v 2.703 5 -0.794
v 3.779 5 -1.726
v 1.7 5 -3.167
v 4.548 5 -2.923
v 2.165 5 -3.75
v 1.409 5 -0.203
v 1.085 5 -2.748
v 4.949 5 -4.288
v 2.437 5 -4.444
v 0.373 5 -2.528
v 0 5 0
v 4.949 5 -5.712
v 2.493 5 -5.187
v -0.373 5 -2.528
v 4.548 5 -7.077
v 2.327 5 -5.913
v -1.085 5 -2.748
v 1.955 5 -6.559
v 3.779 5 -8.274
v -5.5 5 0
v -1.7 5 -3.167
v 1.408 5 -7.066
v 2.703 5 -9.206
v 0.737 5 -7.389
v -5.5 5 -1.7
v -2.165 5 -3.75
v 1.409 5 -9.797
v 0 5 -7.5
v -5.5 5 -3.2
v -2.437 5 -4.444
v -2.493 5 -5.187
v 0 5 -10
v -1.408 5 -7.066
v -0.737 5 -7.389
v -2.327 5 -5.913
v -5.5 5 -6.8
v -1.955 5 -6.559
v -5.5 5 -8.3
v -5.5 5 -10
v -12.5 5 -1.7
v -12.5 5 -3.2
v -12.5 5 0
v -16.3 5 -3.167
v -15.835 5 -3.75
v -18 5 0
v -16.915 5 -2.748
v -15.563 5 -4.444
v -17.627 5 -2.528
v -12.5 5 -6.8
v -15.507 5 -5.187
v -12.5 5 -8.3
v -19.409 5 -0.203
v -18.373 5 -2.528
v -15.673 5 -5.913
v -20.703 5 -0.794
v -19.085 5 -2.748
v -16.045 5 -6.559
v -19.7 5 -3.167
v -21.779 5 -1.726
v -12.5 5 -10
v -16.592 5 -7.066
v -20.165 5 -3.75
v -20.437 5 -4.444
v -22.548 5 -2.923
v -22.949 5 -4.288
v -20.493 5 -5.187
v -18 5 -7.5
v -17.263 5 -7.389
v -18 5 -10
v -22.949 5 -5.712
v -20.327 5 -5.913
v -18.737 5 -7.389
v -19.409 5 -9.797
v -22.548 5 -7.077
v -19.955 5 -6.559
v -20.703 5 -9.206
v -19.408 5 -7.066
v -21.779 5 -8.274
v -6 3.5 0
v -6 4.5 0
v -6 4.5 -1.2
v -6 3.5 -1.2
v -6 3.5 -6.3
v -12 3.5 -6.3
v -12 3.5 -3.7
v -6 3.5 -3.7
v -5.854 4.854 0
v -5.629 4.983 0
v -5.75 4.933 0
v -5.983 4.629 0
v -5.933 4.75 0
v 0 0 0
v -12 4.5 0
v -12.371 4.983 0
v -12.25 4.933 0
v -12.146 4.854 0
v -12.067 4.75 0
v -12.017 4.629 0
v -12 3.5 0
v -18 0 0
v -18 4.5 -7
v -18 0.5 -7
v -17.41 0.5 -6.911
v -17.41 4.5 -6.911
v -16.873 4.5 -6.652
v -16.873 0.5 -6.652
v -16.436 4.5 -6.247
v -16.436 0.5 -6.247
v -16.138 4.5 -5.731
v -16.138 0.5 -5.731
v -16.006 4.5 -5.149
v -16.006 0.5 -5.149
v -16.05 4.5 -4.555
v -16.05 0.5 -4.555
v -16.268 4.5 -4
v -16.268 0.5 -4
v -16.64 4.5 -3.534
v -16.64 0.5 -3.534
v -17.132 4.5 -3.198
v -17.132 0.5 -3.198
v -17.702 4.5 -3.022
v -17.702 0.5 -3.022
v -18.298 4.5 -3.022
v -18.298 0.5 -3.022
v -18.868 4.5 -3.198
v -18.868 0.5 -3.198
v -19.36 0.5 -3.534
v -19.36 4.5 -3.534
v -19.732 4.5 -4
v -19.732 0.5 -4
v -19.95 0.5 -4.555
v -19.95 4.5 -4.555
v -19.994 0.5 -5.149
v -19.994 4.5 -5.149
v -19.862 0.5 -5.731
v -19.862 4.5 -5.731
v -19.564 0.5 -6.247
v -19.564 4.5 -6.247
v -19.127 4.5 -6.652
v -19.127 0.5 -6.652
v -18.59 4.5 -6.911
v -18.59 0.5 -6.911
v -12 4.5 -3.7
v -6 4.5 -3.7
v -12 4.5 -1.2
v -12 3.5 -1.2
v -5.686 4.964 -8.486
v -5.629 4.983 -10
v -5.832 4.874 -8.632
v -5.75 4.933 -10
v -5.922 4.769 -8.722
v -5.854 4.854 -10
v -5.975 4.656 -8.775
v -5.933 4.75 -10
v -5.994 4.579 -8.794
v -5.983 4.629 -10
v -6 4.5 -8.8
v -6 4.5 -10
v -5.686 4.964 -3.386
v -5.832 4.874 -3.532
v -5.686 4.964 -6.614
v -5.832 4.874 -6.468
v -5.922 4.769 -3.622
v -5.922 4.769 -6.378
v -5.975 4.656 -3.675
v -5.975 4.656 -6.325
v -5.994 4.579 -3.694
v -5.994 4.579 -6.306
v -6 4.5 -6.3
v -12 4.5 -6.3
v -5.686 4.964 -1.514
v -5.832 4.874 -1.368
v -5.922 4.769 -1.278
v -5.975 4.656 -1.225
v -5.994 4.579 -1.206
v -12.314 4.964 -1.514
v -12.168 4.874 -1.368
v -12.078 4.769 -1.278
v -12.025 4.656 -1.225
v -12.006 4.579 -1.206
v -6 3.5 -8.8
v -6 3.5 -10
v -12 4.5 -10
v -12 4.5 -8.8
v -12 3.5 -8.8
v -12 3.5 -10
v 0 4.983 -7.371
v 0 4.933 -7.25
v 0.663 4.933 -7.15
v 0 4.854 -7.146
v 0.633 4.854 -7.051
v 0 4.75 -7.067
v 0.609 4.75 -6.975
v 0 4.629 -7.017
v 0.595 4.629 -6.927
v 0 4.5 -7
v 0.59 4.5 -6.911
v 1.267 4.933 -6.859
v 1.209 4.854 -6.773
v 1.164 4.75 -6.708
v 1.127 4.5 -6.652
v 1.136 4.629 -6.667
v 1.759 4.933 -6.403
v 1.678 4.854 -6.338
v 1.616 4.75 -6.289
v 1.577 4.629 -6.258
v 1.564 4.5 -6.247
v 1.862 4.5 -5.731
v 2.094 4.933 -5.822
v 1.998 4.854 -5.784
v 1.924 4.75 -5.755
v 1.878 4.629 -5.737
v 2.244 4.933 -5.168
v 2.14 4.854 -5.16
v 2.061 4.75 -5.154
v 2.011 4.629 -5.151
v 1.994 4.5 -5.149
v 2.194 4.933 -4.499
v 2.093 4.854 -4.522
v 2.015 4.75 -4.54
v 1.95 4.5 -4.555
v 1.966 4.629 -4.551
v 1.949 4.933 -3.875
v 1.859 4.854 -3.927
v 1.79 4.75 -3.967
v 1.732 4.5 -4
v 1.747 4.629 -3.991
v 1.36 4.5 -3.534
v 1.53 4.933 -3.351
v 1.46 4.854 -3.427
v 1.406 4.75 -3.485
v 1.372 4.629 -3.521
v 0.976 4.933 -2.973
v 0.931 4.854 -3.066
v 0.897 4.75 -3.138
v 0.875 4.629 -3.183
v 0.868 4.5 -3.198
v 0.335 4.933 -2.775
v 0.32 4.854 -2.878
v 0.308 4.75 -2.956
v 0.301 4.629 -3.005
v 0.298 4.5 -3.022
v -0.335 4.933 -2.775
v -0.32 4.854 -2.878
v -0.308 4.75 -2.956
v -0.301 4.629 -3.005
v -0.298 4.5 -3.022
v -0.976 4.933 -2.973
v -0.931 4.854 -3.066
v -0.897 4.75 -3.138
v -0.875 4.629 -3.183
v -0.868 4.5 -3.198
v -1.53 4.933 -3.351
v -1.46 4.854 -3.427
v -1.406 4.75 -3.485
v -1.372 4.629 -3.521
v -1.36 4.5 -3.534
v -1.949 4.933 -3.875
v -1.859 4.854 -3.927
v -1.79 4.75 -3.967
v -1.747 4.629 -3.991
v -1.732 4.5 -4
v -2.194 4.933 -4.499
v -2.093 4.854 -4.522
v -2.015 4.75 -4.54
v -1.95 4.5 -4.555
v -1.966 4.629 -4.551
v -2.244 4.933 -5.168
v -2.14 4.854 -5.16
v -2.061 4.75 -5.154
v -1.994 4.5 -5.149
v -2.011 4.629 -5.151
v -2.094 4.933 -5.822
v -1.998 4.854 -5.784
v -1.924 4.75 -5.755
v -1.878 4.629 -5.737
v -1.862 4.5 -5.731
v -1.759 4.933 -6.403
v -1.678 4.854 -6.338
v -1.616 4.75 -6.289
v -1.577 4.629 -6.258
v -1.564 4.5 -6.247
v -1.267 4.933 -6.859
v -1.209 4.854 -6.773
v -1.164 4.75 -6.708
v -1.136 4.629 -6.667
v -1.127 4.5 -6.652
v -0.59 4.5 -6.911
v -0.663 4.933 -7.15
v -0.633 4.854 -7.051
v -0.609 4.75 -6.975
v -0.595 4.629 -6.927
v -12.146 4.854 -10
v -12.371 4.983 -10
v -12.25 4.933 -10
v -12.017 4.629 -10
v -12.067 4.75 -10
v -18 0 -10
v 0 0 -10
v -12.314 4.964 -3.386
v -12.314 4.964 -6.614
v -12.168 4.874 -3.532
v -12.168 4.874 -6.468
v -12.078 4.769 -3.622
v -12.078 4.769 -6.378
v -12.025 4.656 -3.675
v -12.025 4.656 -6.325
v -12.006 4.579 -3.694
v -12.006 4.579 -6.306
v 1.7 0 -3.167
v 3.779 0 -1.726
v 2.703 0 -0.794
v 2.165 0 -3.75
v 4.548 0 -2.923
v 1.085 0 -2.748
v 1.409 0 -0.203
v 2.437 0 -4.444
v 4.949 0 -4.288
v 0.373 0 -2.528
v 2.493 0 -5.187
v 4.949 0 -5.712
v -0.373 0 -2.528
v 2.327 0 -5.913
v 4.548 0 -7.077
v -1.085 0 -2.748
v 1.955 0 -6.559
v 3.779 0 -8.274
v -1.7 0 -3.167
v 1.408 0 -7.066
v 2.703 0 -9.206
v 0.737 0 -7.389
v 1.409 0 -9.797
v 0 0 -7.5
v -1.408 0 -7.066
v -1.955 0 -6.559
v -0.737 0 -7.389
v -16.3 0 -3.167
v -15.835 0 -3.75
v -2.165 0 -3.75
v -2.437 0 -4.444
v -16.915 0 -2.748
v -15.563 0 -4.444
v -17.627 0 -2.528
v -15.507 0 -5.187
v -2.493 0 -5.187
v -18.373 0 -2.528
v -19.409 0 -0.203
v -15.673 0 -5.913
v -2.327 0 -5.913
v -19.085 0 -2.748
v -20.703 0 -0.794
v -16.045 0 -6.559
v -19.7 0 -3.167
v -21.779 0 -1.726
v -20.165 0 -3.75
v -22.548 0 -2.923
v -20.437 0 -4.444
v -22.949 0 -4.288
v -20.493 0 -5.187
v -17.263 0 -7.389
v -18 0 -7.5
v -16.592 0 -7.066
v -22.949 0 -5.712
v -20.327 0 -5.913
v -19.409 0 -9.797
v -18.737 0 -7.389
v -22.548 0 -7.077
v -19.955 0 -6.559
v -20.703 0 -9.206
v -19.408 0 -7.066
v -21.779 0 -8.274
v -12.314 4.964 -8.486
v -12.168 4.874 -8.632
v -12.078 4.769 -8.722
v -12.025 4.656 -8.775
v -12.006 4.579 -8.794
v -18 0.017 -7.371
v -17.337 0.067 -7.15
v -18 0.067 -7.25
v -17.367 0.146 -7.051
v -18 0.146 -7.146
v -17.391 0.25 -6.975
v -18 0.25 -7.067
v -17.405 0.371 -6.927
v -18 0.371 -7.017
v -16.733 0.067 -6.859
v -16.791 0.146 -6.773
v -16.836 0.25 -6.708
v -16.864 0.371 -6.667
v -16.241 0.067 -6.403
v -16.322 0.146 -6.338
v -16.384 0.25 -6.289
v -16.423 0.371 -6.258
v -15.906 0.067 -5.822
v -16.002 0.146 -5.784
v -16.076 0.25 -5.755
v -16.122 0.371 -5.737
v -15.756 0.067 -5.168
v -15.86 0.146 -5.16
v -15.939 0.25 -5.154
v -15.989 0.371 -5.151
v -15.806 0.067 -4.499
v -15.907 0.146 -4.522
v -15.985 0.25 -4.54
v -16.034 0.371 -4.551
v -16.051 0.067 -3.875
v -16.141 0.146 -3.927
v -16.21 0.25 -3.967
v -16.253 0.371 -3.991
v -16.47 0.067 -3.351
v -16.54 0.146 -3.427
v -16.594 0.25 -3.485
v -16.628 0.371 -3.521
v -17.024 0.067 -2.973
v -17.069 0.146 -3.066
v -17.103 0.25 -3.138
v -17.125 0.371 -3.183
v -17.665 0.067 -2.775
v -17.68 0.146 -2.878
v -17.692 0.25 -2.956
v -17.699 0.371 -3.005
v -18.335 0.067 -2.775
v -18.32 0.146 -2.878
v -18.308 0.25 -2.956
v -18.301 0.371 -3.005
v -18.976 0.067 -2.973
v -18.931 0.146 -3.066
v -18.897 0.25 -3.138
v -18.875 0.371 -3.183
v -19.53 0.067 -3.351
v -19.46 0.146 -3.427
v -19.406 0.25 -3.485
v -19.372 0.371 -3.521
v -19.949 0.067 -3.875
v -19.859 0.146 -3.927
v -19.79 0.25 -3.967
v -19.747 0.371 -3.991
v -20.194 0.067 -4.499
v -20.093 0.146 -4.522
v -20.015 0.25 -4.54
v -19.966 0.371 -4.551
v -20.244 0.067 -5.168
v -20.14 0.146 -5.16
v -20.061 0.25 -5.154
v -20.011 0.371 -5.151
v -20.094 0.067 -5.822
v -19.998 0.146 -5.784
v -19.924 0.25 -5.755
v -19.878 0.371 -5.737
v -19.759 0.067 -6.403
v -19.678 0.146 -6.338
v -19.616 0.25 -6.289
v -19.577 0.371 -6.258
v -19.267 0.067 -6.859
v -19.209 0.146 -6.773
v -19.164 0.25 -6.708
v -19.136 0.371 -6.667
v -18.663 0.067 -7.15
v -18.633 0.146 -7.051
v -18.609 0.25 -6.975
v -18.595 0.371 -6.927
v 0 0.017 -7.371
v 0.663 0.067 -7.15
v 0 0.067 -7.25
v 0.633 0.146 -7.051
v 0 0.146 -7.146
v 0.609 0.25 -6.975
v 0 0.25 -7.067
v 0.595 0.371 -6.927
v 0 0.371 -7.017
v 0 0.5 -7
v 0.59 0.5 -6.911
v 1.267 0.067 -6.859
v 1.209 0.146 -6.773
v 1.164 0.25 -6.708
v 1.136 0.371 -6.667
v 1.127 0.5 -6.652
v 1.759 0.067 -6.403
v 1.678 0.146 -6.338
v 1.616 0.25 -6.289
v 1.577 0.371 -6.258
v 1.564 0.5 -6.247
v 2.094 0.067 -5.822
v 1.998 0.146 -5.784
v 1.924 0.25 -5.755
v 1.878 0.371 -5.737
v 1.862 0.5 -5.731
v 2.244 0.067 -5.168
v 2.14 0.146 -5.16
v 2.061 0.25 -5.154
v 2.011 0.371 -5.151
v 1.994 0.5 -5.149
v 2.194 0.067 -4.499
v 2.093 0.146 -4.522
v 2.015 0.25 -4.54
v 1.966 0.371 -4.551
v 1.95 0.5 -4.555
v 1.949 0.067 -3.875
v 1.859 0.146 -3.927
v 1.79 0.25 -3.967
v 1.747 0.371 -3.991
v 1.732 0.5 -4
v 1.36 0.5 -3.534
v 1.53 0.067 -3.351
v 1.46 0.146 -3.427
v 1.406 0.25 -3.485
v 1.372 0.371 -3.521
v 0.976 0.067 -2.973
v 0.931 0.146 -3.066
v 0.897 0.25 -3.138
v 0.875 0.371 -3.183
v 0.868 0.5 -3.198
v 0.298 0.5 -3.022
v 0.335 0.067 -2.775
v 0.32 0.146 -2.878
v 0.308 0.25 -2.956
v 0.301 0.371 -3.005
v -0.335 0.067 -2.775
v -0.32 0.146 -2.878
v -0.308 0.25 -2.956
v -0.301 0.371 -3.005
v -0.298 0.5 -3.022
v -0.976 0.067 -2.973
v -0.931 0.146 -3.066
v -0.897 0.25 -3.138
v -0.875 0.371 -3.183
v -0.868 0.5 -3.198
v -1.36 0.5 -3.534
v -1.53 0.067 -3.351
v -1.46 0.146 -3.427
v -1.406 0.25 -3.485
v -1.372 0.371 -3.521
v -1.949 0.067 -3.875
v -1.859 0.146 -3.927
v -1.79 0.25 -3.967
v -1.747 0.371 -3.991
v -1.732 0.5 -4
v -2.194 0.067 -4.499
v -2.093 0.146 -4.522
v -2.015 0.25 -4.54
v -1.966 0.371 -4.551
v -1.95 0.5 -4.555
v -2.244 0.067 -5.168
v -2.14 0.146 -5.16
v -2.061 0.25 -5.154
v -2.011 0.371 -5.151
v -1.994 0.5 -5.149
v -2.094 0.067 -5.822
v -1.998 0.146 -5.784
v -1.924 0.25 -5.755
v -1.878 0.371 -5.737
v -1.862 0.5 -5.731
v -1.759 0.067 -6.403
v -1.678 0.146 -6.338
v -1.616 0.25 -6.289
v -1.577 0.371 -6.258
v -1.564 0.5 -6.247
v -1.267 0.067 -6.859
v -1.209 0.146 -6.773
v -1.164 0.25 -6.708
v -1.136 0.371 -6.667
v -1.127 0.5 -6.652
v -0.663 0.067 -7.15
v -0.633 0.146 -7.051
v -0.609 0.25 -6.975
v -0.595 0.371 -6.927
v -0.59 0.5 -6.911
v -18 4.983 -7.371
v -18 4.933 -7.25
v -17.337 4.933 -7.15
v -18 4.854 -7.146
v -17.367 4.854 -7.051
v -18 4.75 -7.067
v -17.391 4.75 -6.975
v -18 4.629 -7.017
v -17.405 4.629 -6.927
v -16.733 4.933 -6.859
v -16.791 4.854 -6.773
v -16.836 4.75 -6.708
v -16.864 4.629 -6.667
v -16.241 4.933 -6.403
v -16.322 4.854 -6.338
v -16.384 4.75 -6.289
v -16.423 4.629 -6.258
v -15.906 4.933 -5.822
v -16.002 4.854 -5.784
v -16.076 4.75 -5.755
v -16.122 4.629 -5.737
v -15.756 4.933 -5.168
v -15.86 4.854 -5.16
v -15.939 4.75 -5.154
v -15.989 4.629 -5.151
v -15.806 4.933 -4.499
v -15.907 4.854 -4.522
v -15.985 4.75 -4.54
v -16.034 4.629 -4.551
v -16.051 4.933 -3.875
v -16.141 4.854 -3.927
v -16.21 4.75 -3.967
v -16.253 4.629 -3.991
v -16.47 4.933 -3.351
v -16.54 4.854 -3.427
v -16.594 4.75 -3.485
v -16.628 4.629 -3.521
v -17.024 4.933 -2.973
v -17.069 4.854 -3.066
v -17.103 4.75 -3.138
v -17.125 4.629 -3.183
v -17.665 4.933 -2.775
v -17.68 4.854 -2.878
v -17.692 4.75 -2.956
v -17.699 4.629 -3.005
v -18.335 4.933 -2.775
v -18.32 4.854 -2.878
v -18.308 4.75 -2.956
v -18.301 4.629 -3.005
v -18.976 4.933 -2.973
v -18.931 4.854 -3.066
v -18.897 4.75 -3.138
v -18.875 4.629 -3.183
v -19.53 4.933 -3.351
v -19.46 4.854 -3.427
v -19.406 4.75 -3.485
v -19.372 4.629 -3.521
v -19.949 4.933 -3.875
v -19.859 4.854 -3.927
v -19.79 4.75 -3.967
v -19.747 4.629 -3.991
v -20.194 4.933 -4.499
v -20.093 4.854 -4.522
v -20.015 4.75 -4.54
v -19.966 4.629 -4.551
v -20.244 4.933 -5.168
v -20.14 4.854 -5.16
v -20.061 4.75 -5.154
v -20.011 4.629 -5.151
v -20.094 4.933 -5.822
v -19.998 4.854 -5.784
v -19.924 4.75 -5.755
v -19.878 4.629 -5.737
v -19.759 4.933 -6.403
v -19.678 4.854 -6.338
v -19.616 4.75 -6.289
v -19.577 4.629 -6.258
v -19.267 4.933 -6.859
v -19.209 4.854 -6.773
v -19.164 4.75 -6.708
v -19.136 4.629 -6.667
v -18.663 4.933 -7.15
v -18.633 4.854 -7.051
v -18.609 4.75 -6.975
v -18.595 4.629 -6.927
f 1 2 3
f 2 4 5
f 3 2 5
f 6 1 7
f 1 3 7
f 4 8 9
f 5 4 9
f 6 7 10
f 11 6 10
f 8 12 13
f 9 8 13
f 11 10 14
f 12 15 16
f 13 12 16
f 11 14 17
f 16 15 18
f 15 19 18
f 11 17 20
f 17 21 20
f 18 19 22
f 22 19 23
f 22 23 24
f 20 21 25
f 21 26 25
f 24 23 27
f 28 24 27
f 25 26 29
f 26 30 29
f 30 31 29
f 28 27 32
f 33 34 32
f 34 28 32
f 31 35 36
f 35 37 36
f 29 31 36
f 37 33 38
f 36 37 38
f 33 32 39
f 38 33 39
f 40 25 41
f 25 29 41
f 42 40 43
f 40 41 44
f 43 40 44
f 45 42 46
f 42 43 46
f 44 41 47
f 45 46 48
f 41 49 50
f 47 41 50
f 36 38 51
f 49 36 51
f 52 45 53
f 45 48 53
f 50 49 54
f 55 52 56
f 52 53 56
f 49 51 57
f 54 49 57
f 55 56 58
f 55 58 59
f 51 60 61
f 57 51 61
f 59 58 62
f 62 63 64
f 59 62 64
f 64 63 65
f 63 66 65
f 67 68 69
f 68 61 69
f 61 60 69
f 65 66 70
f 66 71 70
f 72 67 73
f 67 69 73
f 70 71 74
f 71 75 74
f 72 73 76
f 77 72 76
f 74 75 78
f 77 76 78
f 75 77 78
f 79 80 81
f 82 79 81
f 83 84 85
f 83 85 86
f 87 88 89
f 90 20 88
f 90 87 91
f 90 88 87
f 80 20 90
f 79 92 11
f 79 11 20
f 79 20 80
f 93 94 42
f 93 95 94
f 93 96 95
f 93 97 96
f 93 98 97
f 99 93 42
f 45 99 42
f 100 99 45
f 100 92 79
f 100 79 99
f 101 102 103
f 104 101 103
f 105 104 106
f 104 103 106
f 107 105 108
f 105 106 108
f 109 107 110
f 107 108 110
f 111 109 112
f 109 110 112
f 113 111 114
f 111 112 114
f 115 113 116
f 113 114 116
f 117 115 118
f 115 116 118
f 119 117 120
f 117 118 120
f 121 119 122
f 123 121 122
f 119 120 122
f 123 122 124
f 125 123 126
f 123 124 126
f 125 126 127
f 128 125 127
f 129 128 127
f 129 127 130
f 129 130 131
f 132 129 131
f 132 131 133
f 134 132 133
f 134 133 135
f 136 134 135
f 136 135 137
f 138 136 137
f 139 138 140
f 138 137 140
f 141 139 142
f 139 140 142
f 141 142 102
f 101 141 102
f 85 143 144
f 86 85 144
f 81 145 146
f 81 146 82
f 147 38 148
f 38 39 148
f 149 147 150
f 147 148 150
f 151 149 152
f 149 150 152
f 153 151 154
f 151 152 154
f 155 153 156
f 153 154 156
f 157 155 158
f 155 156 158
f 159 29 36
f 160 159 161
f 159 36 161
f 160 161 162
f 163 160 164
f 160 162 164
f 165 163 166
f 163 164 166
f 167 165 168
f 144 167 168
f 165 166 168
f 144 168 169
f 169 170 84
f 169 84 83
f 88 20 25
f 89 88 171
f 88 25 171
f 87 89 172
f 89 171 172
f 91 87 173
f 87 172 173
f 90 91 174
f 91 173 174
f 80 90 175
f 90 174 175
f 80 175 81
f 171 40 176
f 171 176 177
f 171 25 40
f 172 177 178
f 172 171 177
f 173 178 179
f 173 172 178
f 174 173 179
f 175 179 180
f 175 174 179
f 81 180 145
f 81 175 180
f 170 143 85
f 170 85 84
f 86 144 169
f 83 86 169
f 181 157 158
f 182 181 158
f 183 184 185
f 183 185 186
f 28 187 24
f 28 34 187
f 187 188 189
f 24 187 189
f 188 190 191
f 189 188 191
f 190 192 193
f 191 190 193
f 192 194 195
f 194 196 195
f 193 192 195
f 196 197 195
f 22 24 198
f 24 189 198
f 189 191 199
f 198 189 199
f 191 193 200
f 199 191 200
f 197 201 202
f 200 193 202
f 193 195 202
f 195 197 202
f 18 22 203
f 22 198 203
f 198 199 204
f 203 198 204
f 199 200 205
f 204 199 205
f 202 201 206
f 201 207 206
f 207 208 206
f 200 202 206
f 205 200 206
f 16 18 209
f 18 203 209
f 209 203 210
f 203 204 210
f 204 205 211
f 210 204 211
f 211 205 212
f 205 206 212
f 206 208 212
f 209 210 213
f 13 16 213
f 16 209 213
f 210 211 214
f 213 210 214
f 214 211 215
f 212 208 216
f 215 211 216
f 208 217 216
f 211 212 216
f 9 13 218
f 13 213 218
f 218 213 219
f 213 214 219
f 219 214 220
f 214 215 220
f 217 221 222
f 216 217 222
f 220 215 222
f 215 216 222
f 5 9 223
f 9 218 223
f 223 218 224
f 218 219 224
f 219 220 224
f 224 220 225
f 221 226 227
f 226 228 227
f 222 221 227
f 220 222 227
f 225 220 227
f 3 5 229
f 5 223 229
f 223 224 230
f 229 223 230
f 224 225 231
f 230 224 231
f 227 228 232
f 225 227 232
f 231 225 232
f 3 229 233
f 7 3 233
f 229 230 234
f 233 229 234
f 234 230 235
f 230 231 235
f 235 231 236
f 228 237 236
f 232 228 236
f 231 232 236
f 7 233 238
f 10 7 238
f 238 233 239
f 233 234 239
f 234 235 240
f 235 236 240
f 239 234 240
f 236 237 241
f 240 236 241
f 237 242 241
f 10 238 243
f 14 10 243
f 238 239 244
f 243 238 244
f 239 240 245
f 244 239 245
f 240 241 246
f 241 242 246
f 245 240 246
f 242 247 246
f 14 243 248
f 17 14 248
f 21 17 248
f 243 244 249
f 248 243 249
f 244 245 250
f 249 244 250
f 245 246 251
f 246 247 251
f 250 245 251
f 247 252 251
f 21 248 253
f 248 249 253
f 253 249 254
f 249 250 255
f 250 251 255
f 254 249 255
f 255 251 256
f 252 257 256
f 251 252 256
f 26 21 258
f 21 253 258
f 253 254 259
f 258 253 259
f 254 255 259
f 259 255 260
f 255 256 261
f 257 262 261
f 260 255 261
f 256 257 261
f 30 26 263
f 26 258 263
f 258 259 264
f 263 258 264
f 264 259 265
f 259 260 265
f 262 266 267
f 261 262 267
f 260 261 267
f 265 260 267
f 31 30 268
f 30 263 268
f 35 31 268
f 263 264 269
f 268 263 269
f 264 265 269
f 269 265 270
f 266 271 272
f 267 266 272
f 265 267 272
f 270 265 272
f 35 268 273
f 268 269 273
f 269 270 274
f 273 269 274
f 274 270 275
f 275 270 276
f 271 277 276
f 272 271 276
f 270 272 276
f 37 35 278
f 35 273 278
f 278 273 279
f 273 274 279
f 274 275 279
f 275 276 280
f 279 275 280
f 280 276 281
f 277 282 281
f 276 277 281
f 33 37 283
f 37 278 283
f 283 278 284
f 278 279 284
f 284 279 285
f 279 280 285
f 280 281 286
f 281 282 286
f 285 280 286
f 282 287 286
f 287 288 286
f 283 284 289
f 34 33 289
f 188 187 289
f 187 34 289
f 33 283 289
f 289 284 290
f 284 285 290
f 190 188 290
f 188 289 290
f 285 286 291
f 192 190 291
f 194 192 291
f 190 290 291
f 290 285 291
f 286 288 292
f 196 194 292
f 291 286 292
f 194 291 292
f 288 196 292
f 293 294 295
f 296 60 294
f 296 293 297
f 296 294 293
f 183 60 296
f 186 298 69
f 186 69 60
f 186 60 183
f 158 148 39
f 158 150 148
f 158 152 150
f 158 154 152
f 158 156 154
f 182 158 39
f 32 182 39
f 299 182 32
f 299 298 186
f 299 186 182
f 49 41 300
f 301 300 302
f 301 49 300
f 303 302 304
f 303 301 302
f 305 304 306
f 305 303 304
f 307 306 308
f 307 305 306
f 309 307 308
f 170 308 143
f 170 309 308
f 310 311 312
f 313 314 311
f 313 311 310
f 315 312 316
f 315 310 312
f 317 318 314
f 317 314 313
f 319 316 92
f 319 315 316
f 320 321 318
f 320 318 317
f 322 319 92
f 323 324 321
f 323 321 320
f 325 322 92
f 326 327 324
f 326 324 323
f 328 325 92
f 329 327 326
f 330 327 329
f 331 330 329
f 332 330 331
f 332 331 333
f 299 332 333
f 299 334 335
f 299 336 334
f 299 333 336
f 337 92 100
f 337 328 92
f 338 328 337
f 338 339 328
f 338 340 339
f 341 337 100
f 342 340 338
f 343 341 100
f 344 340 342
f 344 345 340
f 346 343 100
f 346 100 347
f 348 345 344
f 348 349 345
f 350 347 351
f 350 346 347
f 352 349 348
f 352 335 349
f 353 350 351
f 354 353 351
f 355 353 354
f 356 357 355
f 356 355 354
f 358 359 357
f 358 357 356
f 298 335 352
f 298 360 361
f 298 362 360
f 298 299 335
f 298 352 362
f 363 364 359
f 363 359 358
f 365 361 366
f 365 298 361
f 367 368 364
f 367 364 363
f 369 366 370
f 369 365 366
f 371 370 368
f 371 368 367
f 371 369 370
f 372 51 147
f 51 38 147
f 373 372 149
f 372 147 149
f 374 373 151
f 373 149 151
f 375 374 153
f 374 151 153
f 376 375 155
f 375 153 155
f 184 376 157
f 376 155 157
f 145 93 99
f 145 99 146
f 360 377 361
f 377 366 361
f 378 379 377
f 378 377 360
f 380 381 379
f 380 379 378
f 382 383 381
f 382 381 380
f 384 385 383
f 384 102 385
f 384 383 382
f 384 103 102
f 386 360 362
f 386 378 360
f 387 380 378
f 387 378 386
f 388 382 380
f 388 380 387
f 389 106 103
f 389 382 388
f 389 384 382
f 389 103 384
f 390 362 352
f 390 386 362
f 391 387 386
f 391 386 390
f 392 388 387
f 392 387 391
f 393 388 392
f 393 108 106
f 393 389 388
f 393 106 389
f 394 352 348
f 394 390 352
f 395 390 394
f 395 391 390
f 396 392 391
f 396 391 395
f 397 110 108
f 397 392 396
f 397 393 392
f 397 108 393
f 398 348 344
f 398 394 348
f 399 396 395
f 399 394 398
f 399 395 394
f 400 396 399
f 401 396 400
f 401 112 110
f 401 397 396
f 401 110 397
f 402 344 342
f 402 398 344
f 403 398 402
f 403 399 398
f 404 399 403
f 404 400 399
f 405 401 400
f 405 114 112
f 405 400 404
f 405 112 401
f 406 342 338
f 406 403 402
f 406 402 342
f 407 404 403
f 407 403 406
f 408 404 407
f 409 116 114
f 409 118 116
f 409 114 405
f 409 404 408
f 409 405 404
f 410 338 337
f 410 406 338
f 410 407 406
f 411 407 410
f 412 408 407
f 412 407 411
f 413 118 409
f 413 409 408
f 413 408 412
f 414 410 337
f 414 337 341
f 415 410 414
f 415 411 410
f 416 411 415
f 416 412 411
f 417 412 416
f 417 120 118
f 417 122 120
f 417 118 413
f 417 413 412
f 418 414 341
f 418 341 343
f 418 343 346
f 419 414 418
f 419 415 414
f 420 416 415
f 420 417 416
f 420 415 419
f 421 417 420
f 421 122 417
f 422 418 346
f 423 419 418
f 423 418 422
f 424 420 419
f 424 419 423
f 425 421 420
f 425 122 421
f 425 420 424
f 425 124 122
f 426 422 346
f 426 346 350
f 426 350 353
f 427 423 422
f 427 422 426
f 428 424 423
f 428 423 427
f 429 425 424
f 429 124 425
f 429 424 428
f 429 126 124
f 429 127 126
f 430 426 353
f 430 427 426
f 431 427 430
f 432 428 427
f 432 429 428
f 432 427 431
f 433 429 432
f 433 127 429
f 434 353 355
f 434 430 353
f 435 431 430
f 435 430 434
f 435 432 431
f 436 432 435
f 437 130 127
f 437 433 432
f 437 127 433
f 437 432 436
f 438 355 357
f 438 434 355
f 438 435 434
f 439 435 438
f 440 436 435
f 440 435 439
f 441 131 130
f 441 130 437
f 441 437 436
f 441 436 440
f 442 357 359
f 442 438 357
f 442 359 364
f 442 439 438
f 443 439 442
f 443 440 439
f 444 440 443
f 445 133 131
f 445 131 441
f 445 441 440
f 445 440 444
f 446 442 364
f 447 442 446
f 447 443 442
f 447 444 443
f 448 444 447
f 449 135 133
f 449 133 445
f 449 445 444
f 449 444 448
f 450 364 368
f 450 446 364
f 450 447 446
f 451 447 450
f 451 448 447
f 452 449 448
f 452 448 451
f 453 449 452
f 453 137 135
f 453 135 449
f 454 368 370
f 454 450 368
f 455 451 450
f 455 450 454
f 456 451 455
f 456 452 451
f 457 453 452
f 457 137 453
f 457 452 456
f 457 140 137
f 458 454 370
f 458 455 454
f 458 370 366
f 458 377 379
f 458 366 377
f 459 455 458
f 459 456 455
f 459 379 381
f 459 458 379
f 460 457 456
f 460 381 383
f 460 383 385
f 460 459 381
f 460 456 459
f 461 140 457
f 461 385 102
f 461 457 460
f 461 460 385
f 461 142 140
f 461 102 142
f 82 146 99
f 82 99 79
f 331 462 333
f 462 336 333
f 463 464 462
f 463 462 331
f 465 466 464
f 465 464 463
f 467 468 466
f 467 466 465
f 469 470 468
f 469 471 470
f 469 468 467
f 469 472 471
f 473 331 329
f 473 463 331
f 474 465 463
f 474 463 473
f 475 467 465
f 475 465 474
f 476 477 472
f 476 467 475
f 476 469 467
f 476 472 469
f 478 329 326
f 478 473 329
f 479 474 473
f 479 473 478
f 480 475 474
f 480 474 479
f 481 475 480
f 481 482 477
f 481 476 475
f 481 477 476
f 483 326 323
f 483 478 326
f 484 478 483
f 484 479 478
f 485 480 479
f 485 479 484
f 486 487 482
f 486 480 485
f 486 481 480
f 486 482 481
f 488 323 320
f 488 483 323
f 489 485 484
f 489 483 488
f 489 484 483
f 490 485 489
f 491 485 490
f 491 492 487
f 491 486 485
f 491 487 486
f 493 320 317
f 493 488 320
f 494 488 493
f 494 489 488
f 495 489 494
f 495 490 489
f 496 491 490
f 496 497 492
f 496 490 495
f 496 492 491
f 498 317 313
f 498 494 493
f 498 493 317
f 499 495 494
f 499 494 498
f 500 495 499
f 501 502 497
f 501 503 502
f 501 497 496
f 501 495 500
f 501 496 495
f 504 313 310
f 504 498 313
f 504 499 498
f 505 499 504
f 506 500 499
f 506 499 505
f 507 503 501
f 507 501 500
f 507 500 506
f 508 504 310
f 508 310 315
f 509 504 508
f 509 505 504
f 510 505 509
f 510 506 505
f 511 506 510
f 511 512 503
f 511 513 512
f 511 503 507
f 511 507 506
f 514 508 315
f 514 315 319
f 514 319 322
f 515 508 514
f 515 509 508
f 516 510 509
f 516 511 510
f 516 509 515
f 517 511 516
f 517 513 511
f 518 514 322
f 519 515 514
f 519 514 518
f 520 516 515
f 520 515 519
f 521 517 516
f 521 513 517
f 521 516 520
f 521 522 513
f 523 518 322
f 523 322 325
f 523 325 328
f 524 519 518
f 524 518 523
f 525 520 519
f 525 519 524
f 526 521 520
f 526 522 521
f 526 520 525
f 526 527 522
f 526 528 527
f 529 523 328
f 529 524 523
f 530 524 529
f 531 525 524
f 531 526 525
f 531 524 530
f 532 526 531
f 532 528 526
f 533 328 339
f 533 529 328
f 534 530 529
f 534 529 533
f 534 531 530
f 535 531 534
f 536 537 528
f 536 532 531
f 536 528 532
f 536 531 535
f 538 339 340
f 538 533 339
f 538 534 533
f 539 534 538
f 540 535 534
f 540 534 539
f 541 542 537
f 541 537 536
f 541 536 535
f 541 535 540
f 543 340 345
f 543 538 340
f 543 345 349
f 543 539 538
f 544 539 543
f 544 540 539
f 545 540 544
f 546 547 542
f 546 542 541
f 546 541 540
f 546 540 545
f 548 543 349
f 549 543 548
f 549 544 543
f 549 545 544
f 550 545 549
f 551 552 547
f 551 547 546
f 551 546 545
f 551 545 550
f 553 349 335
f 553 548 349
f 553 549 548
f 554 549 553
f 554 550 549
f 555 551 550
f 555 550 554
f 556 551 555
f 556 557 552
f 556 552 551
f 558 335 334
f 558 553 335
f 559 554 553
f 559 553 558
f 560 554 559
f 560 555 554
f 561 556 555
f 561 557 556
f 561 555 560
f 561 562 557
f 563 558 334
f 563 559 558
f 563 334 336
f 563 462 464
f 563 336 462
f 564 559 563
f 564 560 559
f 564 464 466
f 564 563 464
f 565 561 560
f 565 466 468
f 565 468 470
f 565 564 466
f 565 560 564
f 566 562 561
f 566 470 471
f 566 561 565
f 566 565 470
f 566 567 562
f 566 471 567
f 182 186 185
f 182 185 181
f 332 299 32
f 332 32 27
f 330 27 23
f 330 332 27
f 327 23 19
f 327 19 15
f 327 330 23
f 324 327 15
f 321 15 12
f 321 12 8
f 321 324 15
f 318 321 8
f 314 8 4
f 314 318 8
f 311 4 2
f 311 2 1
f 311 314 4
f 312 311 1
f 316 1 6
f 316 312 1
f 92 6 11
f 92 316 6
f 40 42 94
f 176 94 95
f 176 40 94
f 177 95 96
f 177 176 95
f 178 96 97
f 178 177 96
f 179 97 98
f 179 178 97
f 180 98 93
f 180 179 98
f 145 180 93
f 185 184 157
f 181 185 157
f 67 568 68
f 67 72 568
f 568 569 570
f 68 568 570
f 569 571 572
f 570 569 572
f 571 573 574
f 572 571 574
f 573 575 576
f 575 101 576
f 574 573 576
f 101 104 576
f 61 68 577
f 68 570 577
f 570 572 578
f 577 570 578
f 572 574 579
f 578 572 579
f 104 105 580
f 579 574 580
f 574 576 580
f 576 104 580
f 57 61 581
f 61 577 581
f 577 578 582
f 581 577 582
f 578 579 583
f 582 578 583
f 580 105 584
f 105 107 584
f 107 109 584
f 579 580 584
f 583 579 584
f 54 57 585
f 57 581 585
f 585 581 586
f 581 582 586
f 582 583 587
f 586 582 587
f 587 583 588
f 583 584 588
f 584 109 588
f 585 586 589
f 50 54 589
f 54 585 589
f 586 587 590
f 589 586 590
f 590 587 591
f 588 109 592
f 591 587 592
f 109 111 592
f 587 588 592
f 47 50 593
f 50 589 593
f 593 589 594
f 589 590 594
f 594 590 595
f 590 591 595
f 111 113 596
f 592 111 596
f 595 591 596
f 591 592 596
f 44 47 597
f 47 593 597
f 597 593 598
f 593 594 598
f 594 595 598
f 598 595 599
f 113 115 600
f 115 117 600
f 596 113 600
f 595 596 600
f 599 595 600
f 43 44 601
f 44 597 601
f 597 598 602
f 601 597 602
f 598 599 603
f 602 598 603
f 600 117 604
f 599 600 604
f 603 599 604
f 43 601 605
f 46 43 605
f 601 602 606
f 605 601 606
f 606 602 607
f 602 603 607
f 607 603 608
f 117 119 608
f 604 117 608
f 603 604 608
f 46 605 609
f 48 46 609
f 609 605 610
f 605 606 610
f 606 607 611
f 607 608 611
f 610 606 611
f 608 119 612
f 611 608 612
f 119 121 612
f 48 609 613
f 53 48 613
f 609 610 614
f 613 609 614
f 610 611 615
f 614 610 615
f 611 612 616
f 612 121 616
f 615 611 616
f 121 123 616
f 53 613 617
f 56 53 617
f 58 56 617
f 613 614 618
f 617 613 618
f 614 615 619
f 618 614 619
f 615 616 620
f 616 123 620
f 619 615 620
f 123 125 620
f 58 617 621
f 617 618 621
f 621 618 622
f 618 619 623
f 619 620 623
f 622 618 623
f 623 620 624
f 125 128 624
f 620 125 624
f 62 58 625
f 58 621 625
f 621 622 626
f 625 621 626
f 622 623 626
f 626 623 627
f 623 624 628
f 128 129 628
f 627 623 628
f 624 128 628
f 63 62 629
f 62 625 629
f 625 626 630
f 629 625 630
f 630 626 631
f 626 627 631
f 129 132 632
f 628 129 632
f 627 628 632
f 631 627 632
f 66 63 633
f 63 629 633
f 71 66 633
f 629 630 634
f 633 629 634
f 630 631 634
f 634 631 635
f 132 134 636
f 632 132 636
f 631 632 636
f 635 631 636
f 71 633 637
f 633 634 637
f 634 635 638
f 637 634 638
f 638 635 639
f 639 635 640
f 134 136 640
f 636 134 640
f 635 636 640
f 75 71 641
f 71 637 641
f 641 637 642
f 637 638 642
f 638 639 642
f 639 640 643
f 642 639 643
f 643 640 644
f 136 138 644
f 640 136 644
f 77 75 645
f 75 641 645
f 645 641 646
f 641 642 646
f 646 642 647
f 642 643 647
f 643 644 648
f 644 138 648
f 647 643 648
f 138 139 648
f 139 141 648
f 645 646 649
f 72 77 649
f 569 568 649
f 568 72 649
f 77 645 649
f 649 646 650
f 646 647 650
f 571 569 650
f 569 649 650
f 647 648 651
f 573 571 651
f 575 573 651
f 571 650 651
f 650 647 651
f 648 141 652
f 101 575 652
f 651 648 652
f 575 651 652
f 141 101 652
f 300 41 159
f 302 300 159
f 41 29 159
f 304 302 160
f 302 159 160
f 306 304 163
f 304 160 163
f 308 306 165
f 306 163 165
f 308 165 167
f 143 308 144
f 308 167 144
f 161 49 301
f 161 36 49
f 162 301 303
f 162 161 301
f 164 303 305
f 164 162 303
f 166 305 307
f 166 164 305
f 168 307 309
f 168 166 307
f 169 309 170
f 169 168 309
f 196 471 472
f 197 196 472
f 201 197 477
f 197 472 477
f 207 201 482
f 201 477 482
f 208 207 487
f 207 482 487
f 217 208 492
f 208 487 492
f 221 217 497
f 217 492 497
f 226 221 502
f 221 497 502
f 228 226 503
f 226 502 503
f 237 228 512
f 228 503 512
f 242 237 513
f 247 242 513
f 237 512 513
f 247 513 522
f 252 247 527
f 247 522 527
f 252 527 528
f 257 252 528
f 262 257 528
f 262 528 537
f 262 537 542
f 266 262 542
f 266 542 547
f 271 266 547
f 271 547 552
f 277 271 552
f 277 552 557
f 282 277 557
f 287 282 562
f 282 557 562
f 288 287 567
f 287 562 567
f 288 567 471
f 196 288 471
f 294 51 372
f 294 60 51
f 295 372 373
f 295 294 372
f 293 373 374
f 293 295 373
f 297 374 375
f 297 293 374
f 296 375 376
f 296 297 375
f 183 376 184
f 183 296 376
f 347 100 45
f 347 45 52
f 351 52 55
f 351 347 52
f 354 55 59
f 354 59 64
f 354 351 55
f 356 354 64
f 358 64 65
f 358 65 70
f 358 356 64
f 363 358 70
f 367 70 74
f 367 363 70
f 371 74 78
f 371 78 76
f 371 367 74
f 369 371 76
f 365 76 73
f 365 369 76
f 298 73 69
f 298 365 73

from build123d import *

# Parameters (mm, degrees)
BOSS_EXTRUDE1_DEPTH = 5
SCREW_HOLES_R       = 2
CUT_EXTRUDE1_DEPTH  = 5
FILLET2_R           = 0.5
BELT_CUT_OUTS_W     = 6
BELT_CUT_OUTS_H     = 1.2
BELT_CUT_OUTS_H_2   = 2.6
CUT_EXTRUDE2_DEPTH  = 1.5
FILLET3_R           = 0.5


with BuildPart() as part:
    # Belt Clamp → Boss-Extrude1 (new body)
    with BuildSketch(Plane(origin=(0, 0, 0), x_dir=(1, 0, 0), z_dir=(0, 1, 0))):
        with BuildLine():
            Line((-18, 10), (0, 10))
            ThreePointArc((0, 10), (5, 5), (0, 0))
            Line((0, 0), (-18, 0))
            ThreePointArc((-18, 0), (-23, 5), (-18, 10))
        make_face()
    extrude(amount=BOSS_EXTRUDE1_DEPTH)

    # Screw Holes → Cut-Extrude1 (cut)
    with BuildSketch(Plane.XZ):
        with Locations(Location((-18, -5, 0), (0, 0, 270))):
            Circle(SCREW_HOLES_R)
        with Locations(Location((0, -5, 0), (0, 0, 270))):
            Circle(SCREW_HOLES_R)
    extrude(amount=-CUT_EXTRUDE1_DEPTH, mode=Mode.SUBTRACT)

    # Fillet2
    fillet2_edges = [part.edges().sort_by_distance(p)[0] for p in [
        (-18, 0, -3),
        (-18, 5, -3),
        (0, 0, -3),
        (0, 5, -3),
    ]]
    fillet(fillet2_edges, radius=FILLET2_R)

    # Belt cut outs → Cut-Extrude2 (cut)
    with BuildSketch(Plane(origin=(0, 5, 0), x_dir=(1, 0, 0), z_dir=(0, 1, 0))):
        with Locations((-9, 0.6)):
            Rectangle(BELT_CUT_OUTS_W, BELT_CUT_OUTS_H)
        with Locations((-9, 5)):
            Rectangle(BELT_CUT_OUTS_W, BELT_CUT_OUTS_H_2)
        with Locations((-9, 9.4)):
            Rectangle(BELT_CUT_OUTS_W, BELT_CUT_OUTS_H)
    extrude(amount=-CUT_EXTRUDE2_DEPTH, mode=Mode.SUBTRACT)

    # Fillet3
    fillet3_edges = [part.edges().sort_by_distance(p)[0] for p in [
        (-12, 5, -0.6),
        (-6, 5, -0.6),
        (-9, 5, -1.2),
        (-12, 5, -9.4),
        (-9, 5, -8.8),
        (-6, 5, -9.4),
        (-12, 5, -5),
        (-9, 5, -3.7),
        (-6, 5, -5),
        (-9, 5, -6.3),
    ]]
    fillet(fillet3_edges, radius=FILLET3_R)


solid = part.part
